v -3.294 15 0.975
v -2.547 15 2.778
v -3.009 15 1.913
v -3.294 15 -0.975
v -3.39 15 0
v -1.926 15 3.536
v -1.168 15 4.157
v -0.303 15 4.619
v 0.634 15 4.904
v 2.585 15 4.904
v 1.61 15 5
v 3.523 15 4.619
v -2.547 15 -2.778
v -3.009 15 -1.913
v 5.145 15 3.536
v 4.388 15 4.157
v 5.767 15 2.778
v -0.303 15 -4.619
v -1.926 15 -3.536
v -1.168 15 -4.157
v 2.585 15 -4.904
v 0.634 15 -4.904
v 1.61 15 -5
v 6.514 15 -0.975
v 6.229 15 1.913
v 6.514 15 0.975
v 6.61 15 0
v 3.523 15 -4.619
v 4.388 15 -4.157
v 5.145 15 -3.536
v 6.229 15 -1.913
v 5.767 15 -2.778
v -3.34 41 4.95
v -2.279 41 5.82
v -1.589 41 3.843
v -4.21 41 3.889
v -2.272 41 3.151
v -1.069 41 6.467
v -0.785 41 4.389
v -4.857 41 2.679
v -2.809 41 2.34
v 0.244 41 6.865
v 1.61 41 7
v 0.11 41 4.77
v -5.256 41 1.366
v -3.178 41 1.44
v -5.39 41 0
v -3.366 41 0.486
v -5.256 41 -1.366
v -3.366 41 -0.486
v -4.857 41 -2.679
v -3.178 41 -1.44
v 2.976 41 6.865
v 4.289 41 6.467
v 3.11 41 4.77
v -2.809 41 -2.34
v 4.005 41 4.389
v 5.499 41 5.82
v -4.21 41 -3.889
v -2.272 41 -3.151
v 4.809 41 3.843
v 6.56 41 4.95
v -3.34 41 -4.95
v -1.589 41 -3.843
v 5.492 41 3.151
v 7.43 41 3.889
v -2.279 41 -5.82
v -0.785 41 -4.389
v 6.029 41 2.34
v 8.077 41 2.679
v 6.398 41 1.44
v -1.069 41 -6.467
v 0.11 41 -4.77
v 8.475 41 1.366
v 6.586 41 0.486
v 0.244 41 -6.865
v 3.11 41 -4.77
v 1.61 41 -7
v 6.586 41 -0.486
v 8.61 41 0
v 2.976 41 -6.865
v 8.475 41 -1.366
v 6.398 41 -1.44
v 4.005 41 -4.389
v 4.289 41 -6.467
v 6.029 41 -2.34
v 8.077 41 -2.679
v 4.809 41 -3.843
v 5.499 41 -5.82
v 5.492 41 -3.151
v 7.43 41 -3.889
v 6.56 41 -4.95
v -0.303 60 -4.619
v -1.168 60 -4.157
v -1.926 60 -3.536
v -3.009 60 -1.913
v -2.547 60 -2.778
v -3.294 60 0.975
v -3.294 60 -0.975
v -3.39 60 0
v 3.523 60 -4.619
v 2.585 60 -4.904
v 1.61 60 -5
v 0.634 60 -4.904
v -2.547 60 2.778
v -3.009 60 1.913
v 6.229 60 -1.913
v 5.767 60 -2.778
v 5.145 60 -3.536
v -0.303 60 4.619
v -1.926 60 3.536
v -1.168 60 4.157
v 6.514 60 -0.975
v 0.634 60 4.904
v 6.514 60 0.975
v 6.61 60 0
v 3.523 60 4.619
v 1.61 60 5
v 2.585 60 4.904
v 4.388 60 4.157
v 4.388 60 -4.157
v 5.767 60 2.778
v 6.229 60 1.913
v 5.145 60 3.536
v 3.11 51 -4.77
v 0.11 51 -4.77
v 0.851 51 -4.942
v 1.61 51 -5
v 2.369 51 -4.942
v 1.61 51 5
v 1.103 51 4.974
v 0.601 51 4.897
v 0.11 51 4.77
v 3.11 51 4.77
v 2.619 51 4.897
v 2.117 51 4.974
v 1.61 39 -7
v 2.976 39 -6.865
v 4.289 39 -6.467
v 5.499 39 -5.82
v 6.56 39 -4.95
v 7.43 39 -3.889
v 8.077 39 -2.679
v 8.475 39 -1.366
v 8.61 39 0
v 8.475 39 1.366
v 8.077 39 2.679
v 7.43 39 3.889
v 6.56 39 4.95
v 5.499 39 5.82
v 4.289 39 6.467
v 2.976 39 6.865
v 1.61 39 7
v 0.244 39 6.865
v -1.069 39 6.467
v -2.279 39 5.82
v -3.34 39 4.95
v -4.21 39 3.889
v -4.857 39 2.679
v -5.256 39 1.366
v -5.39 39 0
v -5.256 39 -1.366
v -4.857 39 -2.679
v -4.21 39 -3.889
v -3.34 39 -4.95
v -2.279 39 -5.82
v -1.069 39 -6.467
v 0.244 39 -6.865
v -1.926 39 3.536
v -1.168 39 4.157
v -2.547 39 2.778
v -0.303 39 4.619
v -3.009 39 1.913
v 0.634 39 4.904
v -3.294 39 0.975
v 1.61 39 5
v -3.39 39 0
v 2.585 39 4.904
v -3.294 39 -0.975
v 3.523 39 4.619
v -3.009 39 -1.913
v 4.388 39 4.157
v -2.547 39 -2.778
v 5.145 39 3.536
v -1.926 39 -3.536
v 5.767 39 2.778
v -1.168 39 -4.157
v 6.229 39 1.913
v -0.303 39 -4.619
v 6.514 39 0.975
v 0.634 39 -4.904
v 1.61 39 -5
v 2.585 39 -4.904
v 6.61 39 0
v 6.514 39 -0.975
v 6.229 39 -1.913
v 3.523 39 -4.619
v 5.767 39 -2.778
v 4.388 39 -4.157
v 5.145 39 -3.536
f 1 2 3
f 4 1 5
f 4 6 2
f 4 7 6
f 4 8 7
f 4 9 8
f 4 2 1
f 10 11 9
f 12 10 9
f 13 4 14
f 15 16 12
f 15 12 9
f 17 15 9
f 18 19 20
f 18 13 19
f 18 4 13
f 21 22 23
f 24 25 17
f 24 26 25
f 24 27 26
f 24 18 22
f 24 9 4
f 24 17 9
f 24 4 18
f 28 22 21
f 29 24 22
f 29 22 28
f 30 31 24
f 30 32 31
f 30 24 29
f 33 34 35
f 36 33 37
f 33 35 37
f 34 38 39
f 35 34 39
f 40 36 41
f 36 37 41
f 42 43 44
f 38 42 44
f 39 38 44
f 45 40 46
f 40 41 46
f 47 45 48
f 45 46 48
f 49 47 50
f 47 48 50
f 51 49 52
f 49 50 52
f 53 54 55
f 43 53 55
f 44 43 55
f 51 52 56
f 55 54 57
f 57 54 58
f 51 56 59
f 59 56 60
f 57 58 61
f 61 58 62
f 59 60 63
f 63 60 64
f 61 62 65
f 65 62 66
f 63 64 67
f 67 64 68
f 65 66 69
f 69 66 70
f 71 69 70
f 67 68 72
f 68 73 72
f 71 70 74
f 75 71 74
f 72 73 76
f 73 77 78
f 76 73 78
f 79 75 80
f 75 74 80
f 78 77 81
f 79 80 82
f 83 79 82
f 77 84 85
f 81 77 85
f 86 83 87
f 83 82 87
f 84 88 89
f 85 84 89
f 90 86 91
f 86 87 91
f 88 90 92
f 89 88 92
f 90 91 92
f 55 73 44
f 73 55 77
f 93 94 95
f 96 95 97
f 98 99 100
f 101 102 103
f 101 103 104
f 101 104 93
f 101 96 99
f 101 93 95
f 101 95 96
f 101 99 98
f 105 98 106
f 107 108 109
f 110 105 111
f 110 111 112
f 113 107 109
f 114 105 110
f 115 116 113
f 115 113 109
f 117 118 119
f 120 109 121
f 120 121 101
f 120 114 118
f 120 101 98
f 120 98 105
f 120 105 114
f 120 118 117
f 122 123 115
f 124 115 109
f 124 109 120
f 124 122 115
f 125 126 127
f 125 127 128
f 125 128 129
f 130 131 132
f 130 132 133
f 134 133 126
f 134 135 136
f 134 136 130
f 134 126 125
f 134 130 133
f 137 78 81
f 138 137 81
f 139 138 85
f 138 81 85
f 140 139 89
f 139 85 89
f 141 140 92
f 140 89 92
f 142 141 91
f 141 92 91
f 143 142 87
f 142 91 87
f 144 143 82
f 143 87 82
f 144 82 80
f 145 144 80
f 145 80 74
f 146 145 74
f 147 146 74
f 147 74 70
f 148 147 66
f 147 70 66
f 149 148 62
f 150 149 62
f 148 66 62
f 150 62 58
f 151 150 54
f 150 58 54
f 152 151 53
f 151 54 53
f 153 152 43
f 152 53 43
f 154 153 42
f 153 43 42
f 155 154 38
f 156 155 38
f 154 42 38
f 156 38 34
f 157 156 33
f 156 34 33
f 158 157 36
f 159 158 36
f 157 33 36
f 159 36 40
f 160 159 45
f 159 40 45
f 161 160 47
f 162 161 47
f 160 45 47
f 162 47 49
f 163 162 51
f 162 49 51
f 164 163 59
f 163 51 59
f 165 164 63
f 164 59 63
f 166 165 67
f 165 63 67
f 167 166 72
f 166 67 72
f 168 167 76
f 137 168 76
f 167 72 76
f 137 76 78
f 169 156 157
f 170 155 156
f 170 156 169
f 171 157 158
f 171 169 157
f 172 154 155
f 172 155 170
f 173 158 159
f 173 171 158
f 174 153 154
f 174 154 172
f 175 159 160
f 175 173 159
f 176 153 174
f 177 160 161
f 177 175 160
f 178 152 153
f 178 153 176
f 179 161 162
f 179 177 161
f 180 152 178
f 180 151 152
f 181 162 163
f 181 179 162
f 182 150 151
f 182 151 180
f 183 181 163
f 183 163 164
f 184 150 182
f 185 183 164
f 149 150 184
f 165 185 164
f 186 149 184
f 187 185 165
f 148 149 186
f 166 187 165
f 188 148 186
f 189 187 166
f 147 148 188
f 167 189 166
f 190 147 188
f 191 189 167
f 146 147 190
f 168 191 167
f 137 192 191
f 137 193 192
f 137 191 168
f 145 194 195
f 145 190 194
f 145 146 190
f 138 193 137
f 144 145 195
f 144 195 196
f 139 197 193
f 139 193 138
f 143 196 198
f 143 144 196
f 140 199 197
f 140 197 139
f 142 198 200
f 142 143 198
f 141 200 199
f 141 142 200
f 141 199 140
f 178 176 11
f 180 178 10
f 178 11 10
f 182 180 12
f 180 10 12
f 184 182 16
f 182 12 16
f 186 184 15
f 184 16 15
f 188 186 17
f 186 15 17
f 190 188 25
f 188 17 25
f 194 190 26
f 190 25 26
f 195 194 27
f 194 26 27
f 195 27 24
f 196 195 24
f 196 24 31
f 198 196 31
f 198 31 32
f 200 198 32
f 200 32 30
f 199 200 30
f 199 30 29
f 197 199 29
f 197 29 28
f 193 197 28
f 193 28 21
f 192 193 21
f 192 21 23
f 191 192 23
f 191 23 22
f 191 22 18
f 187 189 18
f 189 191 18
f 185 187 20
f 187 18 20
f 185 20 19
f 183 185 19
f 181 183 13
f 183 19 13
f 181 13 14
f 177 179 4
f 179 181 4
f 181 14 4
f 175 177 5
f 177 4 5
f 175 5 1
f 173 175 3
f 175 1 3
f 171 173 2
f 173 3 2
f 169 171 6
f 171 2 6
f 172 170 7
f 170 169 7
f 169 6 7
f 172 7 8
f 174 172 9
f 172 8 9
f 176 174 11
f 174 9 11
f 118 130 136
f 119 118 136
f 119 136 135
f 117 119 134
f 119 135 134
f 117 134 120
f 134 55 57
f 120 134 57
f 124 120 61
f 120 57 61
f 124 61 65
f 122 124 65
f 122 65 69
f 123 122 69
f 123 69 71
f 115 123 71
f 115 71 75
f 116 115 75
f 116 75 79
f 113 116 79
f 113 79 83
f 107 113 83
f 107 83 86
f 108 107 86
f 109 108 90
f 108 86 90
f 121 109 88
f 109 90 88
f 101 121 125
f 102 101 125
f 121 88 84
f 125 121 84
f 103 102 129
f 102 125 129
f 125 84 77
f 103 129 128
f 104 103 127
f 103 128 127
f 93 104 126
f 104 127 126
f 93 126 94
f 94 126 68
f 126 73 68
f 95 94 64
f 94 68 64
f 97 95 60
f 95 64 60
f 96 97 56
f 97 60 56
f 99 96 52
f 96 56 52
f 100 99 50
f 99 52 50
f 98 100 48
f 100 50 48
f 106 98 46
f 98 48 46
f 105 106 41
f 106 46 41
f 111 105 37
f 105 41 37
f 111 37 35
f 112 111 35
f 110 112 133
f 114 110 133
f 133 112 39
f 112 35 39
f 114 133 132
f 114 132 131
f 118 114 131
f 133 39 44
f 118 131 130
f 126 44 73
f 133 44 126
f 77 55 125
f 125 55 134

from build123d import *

# Parameters (mm, degrees)
SKETCH1_R           = 5
BOSS_EXTRUDE1_DEPTH = 60
SKETCH2_W           = 3
SKETCH2_H           = 10
CUT_EXTRUDE2_DEPTH  = 30
SKETCH3_R           = 5
CUT_EXTRUDE3_DEPTH  = 15
BOSS_EXTRUDE2_START = -26
SKETCH4_R           = 7
BOSS_EXTRUDE2_DEPTH = 2


with BuildPart() as part:
    # Sketch1 → Boss-Extrude1 (new body)
    with BuildSketch(Plane(origin=(0, 0, 0), x_dir=(1, 0, 0), z_dir=(0, 1, 0))):
        with Locations(Location((1.609928916, 0, 0), (0, 0, 270))):
            Circle(SKETCH1_R)
    extrude(amount=BOSS_EXTRUDE1_DEPTH)

    # Sketch2 → Cut-Extrude2 (cut, symmetric)
    with BuildSketch(Plane.XY):
        with Locations((1.609928916, 46)):
            Rectangle(SKETCH2_W, SKETCH2_H)
    extrude(amount=CUT_EXTRUDE2_DEPTH, both=True, mode=Mode.SUBTRACT)

    # Sketch3 → Cut-Extrude3 (cut)
    with BuildSketch(Plane.XZ):
        with Locations(Location((1.609928916, 0, 0), (0, 0, 270))):
            Circle(SKETCH3_R)
    extrude(amount=-CUT_EXTRUDE3_DEPTH, mode=Mode.SUBTRACT)

    # Sketch4 → Boss-Extrude2 (add)
    with BuildSketch(Plane.XZ.offset(-15).offset(BOSS_EXTRUDE2_START)):
        with Locations(Location((1.609928916, 0, 0), (0, 0, 270))):
            Circle(SKETCH4_R)
    extrude(amount=BOSS_EXTRUDE2_DEPTH)


solid = part.part
